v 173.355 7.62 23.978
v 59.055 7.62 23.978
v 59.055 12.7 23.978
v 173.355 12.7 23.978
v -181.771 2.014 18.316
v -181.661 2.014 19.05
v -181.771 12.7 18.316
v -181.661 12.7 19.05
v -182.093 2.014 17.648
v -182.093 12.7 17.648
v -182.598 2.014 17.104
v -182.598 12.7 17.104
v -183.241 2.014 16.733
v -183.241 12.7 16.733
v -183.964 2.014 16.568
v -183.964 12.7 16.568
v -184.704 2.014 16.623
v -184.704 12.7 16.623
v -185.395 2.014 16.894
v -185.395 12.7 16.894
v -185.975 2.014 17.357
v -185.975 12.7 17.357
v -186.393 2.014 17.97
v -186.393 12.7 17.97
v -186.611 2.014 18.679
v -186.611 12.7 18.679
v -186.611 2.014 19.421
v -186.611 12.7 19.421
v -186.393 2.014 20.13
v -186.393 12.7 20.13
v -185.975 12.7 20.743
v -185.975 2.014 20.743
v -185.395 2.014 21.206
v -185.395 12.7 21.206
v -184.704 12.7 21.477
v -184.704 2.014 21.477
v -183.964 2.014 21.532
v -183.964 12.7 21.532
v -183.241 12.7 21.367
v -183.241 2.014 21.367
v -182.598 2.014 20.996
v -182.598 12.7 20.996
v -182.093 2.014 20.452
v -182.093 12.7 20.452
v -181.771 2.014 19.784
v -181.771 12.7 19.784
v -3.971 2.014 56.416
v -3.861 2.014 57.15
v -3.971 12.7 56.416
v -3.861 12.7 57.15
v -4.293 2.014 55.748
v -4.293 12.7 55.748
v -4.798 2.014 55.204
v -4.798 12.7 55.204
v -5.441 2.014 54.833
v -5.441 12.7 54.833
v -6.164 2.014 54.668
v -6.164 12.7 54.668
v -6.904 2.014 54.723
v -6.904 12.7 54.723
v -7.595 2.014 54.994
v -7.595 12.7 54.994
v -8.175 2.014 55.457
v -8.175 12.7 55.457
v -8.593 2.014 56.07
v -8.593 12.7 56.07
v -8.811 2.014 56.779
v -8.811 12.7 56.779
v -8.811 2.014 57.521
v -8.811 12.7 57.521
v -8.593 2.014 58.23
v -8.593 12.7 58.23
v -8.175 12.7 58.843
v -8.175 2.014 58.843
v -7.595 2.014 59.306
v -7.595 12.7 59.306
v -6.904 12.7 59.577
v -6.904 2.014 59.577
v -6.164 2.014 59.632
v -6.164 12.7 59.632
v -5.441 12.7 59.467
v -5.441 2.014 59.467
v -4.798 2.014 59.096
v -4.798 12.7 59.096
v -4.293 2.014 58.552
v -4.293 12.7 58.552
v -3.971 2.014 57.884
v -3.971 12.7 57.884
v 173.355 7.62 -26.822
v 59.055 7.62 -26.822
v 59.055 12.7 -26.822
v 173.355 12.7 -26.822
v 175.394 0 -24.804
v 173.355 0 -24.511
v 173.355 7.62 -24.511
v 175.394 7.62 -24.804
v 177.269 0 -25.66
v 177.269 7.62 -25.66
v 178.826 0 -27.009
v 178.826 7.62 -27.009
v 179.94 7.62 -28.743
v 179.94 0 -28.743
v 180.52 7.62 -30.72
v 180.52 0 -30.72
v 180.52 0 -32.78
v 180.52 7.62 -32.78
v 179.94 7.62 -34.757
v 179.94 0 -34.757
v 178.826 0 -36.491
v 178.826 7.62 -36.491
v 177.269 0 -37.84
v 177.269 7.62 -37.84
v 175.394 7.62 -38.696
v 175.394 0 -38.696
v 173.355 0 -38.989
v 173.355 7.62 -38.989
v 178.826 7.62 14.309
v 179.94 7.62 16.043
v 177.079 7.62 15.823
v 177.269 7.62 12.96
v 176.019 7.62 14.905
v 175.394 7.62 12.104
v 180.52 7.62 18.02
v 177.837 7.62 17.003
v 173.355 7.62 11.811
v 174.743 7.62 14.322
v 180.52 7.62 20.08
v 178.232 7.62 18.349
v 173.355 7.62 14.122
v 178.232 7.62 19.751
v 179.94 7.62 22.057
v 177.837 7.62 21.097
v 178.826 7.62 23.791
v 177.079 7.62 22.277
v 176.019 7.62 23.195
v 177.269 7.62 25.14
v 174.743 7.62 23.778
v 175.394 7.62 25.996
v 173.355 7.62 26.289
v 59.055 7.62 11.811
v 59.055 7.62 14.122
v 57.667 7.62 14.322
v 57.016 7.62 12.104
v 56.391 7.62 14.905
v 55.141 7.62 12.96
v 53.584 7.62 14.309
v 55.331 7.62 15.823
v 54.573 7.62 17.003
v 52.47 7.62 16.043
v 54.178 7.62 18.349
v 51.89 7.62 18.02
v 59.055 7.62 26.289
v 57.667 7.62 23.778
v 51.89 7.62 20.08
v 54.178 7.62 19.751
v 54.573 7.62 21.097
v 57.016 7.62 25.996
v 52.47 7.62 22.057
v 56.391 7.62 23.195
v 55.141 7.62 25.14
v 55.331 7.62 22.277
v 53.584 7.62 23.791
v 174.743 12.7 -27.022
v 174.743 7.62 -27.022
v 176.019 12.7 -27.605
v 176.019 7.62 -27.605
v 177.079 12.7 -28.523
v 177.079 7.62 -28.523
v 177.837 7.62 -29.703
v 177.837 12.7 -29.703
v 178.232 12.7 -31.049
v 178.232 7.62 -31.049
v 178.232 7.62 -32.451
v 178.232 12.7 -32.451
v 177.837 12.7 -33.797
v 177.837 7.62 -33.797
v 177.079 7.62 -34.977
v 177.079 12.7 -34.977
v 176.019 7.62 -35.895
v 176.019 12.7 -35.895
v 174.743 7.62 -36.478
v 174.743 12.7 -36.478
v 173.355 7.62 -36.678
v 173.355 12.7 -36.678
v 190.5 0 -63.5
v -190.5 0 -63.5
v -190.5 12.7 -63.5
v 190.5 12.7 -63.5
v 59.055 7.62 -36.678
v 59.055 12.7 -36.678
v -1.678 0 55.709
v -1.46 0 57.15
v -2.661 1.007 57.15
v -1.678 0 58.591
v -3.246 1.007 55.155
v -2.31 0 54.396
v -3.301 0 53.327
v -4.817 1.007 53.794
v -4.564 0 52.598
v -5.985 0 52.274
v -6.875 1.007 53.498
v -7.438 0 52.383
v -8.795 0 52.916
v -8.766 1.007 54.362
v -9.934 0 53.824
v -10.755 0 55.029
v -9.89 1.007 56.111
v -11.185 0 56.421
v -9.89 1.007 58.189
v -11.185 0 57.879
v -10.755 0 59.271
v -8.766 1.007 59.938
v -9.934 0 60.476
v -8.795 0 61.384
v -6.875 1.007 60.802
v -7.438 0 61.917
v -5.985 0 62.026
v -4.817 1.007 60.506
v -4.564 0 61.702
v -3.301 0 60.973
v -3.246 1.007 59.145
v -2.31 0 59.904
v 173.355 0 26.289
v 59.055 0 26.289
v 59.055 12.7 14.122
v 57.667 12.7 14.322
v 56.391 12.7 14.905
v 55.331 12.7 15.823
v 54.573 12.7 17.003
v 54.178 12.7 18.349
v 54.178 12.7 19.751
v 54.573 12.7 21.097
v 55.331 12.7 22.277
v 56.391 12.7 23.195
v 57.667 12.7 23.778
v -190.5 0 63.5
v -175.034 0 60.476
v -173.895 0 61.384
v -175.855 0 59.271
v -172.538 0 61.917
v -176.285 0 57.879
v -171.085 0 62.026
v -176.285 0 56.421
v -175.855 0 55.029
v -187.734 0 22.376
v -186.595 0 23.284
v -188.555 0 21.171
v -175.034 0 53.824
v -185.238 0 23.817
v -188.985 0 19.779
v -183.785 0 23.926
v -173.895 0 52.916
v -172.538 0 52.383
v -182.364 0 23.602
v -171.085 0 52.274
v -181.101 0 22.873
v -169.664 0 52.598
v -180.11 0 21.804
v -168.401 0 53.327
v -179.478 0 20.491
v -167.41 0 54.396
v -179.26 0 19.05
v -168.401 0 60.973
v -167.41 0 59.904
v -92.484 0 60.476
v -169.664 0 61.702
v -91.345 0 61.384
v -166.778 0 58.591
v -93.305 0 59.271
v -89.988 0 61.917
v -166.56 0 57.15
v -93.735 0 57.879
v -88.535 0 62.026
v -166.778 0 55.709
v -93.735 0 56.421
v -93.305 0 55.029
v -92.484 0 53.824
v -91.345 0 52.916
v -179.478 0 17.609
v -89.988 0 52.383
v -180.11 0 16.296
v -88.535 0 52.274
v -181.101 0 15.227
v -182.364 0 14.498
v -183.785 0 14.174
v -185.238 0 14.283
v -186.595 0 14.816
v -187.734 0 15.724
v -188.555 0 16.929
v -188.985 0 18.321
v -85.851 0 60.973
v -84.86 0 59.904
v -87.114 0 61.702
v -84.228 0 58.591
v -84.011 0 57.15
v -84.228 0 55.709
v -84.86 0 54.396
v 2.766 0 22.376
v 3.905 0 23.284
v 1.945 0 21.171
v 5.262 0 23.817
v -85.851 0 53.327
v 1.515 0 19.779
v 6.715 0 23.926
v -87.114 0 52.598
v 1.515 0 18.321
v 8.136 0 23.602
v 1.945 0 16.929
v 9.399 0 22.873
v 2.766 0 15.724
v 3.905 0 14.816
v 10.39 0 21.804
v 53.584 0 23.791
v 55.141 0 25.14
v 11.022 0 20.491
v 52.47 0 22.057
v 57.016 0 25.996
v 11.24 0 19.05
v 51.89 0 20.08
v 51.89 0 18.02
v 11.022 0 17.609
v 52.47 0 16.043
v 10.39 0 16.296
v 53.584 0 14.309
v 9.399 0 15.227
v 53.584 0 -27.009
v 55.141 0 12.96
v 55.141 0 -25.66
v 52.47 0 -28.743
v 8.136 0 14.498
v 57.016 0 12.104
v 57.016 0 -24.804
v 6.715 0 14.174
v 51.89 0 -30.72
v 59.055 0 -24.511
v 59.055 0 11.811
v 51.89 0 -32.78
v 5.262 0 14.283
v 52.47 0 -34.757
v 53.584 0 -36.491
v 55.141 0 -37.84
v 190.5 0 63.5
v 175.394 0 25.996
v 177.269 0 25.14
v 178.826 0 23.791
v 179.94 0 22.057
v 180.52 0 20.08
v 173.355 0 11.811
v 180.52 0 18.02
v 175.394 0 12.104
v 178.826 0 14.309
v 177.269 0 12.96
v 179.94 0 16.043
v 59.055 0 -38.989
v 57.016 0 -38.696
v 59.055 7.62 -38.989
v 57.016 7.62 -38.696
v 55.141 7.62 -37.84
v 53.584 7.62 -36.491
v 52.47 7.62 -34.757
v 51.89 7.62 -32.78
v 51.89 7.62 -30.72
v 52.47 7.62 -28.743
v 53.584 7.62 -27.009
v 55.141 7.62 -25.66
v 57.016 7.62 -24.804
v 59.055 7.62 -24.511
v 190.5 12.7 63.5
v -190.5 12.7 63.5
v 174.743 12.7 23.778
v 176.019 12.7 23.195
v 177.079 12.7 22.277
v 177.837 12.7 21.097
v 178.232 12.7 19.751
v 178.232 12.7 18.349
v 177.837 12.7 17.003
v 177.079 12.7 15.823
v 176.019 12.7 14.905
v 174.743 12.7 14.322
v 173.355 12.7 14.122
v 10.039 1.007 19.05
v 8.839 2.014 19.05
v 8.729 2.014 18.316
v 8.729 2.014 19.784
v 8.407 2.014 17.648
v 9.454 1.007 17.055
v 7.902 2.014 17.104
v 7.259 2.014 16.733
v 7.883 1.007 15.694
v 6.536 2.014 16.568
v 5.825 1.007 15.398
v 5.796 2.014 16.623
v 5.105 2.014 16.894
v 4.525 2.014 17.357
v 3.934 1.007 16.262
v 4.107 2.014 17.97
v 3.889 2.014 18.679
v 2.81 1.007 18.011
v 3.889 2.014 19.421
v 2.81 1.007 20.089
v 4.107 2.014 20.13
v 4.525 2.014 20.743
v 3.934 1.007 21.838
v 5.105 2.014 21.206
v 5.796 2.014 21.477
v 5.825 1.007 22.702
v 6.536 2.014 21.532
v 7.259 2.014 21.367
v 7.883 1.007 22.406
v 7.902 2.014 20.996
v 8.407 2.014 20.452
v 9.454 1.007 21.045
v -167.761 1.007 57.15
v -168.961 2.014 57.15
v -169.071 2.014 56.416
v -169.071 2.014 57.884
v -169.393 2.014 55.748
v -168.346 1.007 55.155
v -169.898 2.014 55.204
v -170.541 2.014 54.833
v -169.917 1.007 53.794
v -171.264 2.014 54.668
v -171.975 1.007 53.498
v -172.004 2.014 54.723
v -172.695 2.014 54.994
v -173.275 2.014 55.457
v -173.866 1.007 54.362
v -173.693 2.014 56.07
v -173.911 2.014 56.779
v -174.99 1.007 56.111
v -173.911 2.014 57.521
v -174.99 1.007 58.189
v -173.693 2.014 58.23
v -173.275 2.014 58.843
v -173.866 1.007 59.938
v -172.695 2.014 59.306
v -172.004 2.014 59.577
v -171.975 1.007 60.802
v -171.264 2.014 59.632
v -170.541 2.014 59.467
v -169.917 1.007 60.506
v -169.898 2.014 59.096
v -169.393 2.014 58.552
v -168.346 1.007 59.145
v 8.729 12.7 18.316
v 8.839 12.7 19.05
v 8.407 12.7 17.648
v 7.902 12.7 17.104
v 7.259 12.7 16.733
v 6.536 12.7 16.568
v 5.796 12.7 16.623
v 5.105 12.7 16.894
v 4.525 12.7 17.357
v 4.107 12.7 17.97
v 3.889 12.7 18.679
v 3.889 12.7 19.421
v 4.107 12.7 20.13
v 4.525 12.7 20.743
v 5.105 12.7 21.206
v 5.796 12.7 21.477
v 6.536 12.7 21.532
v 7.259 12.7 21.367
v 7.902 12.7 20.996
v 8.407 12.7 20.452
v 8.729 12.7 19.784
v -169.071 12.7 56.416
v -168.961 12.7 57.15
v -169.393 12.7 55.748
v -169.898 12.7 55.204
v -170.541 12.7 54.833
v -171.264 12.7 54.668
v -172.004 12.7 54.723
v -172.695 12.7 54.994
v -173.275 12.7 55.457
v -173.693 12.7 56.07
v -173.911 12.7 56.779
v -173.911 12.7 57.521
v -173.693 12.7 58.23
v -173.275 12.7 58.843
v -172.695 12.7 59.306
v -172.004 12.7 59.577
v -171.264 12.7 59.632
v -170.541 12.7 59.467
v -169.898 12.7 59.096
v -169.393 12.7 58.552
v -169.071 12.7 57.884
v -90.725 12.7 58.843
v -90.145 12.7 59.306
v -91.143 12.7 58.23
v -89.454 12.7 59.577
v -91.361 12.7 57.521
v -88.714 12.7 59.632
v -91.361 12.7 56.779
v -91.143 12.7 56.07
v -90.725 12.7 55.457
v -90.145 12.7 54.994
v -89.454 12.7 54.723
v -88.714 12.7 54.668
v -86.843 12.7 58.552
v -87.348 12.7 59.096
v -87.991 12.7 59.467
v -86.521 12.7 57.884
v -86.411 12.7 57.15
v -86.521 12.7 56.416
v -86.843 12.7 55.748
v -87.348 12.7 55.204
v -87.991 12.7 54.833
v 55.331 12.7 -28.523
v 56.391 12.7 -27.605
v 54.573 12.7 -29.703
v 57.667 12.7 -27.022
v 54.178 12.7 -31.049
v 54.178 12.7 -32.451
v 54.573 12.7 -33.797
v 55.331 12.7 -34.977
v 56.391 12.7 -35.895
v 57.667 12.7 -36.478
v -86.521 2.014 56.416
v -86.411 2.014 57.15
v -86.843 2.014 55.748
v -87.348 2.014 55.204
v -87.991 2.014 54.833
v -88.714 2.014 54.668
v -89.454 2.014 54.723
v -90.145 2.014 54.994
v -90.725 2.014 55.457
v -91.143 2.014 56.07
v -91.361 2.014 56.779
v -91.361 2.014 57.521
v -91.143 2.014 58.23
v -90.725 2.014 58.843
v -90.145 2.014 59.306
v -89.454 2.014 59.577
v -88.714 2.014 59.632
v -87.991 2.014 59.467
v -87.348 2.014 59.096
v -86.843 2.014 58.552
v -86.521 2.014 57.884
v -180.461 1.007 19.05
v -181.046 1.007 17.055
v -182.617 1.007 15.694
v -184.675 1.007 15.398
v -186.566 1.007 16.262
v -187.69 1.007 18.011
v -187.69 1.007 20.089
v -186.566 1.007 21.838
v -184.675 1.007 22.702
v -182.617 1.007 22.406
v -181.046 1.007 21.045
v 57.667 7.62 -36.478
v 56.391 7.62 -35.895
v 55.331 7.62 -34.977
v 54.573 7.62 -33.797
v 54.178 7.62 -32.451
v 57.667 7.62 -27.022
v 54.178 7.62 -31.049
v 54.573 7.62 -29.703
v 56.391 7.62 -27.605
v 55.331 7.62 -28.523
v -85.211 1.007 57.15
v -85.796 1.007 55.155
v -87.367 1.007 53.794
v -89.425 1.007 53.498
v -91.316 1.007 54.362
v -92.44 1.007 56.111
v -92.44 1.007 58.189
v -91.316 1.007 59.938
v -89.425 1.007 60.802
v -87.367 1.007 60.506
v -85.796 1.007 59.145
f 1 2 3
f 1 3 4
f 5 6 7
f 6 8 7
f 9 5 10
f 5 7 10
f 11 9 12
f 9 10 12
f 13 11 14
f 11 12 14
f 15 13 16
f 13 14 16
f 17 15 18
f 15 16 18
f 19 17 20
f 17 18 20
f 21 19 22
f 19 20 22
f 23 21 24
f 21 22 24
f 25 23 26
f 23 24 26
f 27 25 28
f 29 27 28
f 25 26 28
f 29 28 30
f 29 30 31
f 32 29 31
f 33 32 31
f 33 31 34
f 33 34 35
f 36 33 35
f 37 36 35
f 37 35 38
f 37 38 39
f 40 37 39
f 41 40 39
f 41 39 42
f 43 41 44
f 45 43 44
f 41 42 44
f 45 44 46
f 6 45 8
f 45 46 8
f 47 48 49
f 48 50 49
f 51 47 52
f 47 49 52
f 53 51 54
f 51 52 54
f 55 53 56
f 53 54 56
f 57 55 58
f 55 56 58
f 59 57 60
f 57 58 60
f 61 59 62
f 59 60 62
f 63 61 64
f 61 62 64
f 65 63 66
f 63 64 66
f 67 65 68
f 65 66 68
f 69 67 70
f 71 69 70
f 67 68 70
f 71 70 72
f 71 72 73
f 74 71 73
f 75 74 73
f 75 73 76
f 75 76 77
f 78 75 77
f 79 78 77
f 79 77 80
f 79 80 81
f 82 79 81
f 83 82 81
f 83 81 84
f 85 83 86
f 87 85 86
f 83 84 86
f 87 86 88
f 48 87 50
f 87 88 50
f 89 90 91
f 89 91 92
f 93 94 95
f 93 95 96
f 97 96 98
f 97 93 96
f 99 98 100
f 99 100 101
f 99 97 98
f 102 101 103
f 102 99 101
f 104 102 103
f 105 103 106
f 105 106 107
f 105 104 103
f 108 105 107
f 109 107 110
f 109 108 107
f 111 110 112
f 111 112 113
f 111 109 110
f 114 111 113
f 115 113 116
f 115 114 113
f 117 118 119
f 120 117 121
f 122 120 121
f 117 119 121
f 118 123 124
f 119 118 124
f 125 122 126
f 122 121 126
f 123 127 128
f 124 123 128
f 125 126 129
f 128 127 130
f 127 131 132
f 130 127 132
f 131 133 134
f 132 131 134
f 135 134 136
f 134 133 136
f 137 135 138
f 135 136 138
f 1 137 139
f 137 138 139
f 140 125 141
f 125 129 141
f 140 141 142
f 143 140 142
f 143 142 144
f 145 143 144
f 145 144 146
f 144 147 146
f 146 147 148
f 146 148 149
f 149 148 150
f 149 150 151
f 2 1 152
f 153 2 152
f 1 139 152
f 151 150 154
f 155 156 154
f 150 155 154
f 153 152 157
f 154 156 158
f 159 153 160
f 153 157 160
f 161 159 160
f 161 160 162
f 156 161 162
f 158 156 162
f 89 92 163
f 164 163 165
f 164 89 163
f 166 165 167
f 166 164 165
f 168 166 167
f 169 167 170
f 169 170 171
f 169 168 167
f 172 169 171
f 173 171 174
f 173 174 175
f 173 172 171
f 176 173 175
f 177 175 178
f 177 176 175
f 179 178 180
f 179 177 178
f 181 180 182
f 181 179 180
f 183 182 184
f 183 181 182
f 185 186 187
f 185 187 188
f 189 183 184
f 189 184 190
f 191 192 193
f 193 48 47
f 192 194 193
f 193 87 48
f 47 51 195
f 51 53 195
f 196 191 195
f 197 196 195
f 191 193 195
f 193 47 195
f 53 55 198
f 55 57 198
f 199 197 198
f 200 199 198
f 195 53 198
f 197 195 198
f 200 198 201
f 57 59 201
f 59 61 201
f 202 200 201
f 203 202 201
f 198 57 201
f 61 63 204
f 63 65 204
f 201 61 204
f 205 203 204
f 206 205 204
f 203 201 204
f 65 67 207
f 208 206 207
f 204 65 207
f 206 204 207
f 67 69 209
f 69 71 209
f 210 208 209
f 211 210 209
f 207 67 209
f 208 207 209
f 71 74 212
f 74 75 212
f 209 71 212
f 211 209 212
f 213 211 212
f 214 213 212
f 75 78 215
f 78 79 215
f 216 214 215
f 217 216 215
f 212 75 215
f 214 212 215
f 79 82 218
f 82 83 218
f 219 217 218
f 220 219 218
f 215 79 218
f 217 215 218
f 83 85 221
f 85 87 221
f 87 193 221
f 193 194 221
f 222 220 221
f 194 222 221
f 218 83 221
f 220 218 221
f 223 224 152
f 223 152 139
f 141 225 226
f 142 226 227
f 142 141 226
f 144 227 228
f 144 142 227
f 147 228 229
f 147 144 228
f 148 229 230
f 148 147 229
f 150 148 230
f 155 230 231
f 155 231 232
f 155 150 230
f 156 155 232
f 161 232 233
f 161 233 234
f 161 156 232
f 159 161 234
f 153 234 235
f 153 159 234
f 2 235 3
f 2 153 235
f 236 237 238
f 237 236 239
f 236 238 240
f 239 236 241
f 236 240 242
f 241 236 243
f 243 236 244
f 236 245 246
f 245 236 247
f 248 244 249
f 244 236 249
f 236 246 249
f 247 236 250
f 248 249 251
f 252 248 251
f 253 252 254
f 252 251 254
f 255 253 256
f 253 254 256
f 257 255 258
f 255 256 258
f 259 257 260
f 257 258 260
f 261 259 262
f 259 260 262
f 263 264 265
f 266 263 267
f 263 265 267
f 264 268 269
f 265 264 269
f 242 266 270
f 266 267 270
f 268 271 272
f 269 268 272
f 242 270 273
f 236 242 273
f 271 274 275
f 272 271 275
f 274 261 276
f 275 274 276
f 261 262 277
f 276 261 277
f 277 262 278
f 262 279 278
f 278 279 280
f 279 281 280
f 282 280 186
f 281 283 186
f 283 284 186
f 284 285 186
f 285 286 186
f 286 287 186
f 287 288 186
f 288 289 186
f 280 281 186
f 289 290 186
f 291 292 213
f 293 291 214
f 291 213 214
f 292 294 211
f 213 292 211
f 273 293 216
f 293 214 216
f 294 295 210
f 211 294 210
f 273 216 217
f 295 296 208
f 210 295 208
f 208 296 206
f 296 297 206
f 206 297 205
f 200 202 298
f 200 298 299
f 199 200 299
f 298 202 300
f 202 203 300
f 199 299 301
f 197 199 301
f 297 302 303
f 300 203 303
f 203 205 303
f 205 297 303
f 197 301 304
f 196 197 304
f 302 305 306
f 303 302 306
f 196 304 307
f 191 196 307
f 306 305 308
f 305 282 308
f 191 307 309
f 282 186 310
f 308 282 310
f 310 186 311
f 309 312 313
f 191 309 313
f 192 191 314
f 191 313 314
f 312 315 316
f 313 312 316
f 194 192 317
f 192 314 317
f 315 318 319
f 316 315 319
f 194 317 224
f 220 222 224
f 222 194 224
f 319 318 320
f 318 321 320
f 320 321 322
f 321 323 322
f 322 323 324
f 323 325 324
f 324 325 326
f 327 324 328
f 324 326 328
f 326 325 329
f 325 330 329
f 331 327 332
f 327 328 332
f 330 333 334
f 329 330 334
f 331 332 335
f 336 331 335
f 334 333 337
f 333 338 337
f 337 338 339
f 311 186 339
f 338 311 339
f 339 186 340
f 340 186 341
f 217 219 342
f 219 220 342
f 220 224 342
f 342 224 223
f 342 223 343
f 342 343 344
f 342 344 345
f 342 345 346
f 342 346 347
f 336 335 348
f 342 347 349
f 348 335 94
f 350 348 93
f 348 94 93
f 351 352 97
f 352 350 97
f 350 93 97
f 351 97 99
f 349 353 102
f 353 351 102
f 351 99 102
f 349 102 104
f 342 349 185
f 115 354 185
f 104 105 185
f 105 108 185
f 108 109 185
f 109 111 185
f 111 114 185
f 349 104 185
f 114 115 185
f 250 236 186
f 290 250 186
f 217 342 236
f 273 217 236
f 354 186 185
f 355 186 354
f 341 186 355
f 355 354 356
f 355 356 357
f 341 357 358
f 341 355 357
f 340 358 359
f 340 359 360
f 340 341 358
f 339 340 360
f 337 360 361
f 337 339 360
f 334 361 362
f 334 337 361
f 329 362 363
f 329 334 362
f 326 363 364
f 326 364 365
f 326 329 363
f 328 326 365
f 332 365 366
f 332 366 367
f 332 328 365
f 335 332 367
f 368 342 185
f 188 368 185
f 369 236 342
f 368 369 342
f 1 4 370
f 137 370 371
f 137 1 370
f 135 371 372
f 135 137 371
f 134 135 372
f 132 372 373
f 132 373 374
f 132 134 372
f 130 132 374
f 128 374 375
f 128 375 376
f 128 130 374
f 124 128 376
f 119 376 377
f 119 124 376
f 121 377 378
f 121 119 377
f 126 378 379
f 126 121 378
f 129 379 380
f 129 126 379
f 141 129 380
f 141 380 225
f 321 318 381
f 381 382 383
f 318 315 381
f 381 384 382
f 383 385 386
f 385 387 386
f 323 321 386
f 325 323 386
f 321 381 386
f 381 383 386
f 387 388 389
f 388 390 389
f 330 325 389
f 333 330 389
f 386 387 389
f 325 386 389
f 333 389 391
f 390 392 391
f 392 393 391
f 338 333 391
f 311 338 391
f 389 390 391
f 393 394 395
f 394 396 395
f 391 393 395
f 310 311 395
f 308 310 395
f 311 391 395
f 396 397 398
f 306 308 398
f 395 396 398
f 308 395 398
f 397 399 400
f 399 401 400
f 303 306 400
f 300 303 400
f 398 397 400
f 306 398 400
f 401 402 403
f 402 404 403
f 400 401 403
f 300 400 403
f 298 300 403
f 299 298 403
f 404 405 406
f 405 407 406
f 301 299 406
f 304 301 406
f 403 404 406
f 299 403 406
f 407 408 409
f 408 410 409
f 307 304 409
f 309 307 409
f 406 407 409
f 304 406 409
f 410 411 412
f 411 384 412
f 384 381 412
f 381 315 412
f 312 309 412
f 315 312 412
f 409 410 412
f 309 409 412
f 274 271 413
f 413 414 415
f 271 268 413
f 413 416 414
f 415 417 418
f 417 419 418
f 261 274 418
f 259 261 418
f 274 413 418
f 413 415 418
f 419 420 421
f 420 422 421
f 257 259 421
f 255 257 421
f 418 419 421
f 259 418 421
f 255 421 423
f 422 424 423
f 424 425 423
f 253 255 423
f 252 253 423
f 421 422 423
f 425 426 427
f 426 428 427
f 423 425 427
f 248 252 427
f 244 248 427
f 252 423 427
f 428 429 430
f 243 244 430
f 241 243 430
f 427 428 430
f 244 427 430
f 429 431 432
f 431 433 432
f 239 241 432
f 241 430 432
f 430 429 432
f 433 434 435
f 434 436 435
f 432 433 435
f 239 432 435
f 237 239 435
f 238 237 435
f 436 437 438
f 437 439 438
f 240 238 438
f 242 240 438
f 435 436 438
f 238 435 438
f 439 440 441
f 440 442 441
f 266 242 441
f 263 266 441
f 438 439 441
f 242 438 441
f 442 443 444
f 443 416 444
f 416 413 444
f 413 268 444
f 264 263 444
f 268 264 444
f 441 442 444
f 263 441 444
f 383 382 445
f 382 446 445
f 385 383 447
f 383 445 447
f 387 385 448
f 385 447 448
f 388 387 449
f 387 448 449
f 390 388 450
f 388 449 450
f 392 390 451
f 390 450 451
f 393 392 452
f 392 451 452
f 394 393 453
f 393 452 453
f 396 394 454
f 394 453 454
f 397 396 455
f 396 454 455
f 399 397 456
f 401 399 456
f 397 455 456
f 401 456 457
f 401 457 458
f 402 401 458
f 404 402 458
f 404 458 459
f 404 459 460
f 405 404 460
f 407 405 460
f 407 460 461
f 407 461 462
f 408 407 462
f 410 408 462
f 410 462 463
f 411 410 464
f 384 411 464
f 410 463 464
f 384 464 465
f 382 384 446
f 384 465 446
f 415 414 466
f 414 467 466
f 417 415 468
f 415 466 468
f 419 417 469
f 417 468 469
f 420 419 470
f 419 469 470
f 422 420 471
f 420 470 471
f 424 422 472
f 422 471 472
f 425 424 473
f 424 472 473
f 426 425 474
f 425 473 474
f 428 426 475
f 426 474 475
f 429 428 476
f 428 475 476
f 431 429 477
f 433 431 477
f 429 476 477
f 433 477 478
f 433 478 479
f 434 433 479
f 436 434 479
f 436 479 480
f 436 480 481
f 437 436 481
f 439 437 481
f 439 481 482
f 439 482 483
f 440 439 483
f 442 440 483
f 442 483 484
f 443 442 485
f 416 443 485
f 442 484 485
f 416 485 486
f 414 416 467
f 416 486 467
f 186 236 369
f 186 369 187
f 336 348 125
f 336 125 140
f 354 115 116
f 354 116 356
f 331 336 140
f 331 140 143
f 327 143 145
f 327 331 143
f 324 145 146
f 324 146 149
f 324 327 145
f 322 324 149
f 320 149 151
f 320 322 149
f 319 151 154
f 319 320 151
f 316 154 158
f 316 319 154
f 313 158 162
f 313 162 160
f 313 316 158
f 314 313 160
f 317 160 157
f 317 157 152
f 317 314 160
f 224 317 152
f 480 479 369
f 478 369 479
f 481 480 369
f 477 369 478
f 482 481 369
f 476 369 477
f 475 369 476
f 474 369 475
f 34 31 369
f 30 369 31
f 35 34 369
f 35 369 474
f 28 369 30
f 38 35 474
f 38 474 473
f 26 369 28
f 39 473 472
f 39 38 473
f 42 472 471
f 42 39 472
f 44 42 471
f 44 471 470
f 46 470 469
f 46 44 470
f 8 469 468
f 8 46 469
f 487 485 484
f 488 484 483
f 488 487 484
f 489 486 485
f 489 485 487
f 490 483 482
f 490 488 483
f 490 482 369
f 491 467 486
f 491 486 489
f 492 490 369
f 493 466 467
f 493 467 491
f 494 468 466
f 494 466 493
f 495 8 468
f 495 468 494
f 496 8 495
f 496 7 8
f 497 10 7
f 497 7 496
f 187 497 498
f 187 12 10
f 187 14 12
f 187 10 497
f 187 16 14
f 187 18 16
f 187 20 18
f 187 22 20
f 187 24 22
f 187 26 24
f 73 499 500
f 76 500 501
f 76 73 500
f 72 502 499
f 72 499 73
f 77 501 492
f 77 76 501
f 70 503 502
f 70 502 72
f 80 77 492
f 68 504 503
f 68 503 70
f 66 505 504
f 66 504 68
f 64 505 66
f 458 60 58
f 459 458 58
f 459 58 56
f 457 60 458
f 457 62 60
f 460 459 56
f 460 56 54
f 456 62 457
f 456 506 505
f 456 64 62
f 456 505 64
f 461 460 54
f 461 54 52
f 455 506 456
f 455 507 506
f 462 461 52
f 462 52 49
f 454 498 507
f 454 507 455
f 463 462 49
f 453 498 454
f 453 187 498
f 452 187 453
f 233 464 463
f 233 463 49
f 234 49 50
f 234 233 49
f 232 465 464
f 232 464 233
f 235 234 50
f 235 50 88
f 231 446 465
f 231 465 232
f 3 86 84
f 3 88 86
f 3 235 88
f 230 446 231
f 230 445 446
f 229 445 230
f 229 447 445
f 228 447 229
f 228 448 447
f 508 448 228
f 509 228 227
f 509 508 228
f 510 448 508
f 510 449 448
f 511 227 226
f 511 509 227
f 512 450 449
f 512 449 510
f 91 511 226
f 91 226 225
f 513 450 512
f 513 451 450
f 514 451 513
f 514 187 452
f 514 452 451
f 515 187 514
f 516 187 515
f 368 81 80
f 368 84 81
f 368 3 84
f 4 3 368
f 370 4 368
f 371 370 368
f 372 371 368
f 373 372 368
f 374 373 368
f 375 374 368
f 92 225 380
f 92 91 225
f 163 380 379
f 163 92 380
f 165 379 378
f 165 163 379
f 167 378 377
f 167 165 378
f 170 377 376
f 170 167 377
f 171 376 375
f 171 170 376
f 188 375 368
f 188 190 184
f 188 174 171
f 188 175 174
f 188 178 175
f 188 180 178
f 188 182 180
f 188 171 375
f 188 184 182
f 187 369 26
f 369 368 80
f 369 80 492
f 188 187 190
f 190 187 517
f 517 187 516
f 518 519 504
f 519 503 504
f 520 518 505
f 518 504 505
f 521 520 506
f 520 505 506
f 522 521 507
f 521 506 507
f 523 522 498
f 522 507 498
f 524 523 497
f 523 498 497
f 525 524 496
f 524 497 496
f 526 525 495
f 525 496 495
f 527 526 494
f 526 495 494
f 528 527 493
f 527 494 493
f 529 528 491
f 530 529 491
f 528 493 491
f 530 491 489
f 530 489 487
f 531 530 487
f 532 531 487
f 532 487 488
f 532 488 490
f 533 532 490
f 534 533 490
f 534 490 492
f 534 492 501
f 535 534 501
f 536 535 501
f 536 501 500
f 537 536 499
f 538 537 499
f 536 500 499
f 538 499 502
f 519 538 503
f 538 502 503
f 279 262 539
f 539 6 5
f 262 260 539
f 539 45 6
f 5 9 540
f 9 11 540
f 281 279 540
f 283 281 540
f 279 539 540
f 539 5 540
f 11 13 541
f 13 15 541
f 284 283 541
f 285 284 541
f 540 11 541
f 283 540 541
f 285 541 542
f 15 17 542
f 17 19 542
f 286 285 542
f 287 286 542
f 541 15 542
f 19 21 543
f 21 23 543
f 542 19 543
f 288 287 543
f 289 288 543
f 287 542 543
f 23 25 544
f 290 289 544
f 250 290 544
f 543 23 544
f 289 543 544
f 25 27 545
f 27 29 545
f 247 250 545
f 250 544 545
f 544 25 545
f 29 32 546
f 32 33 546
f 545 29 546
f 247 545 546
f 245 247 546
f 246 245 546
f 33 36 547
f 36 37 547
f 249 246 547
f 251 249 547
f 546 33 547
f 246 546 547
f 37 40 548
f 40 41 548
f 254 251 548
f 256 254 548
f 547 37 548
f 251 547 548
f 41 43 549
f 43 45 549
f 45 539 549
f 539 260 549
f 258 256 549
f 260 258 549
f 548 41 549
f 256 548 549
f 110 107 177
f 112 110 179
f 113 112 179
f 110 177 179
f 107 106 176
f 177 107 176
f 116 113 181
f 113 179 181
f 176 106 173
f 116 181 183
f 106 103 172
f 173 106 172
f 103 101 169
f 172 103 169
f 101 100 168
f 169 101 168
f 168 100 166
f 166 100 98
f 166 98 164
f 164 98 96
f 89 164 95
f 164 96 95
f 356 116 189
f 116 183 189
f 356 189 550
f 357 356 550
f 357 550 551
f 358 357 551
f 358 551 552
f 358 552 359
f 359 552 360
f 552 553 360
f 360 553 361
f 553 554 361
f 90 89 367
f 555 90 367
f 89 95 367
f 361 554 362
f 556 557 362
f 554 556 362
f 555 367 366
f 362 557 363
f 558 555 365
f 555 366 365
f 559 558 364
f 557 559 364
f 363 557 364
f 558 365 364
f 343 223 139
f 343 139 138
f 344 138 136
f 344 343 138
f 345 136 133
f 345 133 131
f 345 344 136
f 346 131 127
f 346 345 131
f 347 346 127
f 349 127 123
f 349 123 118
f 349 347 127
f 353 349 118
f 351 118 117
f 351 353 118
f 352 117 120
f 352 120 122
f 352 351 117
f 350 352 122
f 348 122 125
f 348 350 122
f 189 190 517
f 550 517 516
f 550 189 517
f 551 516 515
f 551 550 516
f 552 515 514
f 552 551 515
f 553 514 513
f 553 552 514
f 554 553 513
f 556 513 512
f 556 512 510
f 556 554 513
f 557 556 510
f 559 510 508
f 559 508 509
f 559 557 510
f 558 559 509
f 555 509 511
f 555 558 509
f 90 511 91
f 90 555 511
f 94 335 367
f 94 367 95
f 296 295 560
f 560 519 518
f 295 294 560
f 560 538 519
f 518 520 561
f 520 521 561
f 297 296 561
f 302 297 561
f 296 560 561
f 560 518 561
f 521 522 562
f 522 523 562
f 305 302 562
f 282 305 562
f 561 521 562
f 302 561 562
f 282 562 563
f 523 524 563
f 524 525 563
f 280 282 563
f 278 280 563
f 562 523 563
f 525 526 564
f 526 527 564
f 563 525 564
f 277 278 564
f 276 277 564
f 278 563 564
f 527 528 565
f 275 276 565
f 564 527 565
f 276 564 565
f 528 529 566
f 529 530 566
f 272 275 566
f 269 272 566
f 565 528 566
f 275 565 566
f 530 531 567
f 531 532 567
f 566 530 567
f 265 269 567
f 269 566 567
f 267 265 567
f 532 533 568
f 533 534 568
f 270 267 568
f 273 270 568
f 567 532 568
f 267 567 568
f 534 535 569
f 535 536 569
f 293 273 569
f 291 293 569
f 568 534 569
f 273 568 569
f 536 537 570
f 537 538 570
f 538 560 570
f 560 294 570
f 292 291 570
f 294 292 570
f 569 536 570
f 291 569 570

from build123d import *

# Parameters (mm, degrees)
SKETCH2_W                                          = 381
SKETCH2_H                                          = 127
BOSS_EXTRUDE1_DEPTH                                = 12.7
CUT_EXTRUDE1_DEPTH                                 = 12.7
CSK_FOR_10_FLAT_HEAD_MACHINE_SCREW_100_D           = 4.9784
CSK_FOR_10_FLAT_HEAD_MACHINE_SCREW_100_CSINK_D     = 9.779
CSK_FOR_10_FLAT_HEAD_MACHINE_SCREW_100_CSINK_ANGLE = 100
CSK_FOR_10_FLAT_HEAD_MACHINE_SCREW_2_D             = 4.9784
CSK_FOR_10_FLAT_HEAD_MACHINE_SCREW_2_CSINK_D       = 9.779
CSK_FOR_10_FLAT_HEAD_MACHINE_SCREW_2_CSINK_ANGLE   = 100
CUT_EXTRUDE3_DEPTH                                 = 7.62


with BuildPart() as part:
    # Sketch2 → Boss-Extrude1 (new body)
    with BuildSketch(Plane(origin=(0, 0, 0), x_dir=(1, 0, 0), z_dir=(0, 1, 0))):
        Rectangle(SKETCH2_W, SKETCH2_H)
    extrude(amount=BOSS_EXTRUDE1_DEPTH)

    # Sketch8 → Cut-Extrude1 (cut)
    with BuildSketch(Plane.XZ):
        with BuildLine():
            Line((59.055, 23.9776), (173.355, 23.9776))
            ThreePointArc((173.355, 23.9776), (178.2826, 19.05), (173.355, 14.1224))
            Line((173.355, 14.1224), (59.055, 14.1224))
            ThreePointArc((59.055, 14.1224), (54.1274, 19.05), (59.055, 23.9776))
        make_face()
        with BuildLine():
            Line((59.055, -26.8224), (173.355, -26.8224))
            ThreePointArc((173.355, -26.8224), (178.2826, -31.75), (173.355, -36.6776))
            Line((173.355, -36.6776), (59.055, -36.6776))
            ThreePointArc((59.055, -36.6776), (54.1274, -31.75), (59.055, -26.8224))
        make_face()
    extrude(amount=-CUT_EXTRUDE1_DEPTH, mode=Mode.SUBTRACT)

    # CSK for _10 Flat Head Machine Screw _100 (through all)
    with Locations(Plane(origin=(0, 0, 0), x_dir=(-1, 0, 0), z_dir=(0, -1, 0))):
        with Locations((171.45, -57.15), (88.9, -57.15), (6.35, -57.15)):
            CounterSinkHole(CSK_FOR_10_FLAT_HEAD_MACHINE_SCREW_100_D / 2, CSK_FOR_10_FLAT_HEAD_MACHINE_SCREW_100_CSINK_D / 2, counter_sink_angle=CSK_FOR_10_FLAT_HEAD_MACHINE_SCREW_100_CSINK_ANGLE)

    # CSK for _10 Flat Head Machine Screw  2 (through all)
    with Locations(Plane(origin=(0, 0, 0), x_dir=(-1, 0, 0), z_dir=(0, -1, 0))):
        with Locations((184.15, -19.05), (-6.35, -19.05)):
            CounterSinkHole(CSK_FOR_10_FLAT_HEAD_MACHINE_SCREW_2_D / 2, CSK_FOR_10_FLAT_HEAD_MACHINE_SCREW_2_CSINK_D / 2, counter_sink_angle=CSK_FOR_10_FLAT_HEAD_MACHINE_SCREW_2_CSINK_ANGLE)

    # Sketch16 → Cut-Extrude3 (cut)
    with BuildSketch(Plane.XZ):
        with BuildLine():
            Line((59.055, 26.289), (173.355, 26.289))
            ThreePointArc((173.355, 26.289), (180.594, 19.05), (173.355, 11.811))
            Line((173.355, 11.811), (59.055, 11.811))
            ThreePointArc((59.055, 11.811), (51.816, 19.05), (59.055, 26.289))
        make_face()
        with BuildLine():
            Line((59.055, -24.511), (173.355, -24.511))
            ThreePointArc((173.355, -24.511), (180.594, -31.75), (173.355, -38.989))
            Line((173.355, -38.989), (59.055, -38.989))
            ThreePointArc((59.055, -38.989), (51.816, -31.75), (59.055, -24.511))
        make_face()
    extrude(amount=-CUT_EXTRUDE3_DEPTH, mode=Mode.SUBTRACT)


solid = part.part
